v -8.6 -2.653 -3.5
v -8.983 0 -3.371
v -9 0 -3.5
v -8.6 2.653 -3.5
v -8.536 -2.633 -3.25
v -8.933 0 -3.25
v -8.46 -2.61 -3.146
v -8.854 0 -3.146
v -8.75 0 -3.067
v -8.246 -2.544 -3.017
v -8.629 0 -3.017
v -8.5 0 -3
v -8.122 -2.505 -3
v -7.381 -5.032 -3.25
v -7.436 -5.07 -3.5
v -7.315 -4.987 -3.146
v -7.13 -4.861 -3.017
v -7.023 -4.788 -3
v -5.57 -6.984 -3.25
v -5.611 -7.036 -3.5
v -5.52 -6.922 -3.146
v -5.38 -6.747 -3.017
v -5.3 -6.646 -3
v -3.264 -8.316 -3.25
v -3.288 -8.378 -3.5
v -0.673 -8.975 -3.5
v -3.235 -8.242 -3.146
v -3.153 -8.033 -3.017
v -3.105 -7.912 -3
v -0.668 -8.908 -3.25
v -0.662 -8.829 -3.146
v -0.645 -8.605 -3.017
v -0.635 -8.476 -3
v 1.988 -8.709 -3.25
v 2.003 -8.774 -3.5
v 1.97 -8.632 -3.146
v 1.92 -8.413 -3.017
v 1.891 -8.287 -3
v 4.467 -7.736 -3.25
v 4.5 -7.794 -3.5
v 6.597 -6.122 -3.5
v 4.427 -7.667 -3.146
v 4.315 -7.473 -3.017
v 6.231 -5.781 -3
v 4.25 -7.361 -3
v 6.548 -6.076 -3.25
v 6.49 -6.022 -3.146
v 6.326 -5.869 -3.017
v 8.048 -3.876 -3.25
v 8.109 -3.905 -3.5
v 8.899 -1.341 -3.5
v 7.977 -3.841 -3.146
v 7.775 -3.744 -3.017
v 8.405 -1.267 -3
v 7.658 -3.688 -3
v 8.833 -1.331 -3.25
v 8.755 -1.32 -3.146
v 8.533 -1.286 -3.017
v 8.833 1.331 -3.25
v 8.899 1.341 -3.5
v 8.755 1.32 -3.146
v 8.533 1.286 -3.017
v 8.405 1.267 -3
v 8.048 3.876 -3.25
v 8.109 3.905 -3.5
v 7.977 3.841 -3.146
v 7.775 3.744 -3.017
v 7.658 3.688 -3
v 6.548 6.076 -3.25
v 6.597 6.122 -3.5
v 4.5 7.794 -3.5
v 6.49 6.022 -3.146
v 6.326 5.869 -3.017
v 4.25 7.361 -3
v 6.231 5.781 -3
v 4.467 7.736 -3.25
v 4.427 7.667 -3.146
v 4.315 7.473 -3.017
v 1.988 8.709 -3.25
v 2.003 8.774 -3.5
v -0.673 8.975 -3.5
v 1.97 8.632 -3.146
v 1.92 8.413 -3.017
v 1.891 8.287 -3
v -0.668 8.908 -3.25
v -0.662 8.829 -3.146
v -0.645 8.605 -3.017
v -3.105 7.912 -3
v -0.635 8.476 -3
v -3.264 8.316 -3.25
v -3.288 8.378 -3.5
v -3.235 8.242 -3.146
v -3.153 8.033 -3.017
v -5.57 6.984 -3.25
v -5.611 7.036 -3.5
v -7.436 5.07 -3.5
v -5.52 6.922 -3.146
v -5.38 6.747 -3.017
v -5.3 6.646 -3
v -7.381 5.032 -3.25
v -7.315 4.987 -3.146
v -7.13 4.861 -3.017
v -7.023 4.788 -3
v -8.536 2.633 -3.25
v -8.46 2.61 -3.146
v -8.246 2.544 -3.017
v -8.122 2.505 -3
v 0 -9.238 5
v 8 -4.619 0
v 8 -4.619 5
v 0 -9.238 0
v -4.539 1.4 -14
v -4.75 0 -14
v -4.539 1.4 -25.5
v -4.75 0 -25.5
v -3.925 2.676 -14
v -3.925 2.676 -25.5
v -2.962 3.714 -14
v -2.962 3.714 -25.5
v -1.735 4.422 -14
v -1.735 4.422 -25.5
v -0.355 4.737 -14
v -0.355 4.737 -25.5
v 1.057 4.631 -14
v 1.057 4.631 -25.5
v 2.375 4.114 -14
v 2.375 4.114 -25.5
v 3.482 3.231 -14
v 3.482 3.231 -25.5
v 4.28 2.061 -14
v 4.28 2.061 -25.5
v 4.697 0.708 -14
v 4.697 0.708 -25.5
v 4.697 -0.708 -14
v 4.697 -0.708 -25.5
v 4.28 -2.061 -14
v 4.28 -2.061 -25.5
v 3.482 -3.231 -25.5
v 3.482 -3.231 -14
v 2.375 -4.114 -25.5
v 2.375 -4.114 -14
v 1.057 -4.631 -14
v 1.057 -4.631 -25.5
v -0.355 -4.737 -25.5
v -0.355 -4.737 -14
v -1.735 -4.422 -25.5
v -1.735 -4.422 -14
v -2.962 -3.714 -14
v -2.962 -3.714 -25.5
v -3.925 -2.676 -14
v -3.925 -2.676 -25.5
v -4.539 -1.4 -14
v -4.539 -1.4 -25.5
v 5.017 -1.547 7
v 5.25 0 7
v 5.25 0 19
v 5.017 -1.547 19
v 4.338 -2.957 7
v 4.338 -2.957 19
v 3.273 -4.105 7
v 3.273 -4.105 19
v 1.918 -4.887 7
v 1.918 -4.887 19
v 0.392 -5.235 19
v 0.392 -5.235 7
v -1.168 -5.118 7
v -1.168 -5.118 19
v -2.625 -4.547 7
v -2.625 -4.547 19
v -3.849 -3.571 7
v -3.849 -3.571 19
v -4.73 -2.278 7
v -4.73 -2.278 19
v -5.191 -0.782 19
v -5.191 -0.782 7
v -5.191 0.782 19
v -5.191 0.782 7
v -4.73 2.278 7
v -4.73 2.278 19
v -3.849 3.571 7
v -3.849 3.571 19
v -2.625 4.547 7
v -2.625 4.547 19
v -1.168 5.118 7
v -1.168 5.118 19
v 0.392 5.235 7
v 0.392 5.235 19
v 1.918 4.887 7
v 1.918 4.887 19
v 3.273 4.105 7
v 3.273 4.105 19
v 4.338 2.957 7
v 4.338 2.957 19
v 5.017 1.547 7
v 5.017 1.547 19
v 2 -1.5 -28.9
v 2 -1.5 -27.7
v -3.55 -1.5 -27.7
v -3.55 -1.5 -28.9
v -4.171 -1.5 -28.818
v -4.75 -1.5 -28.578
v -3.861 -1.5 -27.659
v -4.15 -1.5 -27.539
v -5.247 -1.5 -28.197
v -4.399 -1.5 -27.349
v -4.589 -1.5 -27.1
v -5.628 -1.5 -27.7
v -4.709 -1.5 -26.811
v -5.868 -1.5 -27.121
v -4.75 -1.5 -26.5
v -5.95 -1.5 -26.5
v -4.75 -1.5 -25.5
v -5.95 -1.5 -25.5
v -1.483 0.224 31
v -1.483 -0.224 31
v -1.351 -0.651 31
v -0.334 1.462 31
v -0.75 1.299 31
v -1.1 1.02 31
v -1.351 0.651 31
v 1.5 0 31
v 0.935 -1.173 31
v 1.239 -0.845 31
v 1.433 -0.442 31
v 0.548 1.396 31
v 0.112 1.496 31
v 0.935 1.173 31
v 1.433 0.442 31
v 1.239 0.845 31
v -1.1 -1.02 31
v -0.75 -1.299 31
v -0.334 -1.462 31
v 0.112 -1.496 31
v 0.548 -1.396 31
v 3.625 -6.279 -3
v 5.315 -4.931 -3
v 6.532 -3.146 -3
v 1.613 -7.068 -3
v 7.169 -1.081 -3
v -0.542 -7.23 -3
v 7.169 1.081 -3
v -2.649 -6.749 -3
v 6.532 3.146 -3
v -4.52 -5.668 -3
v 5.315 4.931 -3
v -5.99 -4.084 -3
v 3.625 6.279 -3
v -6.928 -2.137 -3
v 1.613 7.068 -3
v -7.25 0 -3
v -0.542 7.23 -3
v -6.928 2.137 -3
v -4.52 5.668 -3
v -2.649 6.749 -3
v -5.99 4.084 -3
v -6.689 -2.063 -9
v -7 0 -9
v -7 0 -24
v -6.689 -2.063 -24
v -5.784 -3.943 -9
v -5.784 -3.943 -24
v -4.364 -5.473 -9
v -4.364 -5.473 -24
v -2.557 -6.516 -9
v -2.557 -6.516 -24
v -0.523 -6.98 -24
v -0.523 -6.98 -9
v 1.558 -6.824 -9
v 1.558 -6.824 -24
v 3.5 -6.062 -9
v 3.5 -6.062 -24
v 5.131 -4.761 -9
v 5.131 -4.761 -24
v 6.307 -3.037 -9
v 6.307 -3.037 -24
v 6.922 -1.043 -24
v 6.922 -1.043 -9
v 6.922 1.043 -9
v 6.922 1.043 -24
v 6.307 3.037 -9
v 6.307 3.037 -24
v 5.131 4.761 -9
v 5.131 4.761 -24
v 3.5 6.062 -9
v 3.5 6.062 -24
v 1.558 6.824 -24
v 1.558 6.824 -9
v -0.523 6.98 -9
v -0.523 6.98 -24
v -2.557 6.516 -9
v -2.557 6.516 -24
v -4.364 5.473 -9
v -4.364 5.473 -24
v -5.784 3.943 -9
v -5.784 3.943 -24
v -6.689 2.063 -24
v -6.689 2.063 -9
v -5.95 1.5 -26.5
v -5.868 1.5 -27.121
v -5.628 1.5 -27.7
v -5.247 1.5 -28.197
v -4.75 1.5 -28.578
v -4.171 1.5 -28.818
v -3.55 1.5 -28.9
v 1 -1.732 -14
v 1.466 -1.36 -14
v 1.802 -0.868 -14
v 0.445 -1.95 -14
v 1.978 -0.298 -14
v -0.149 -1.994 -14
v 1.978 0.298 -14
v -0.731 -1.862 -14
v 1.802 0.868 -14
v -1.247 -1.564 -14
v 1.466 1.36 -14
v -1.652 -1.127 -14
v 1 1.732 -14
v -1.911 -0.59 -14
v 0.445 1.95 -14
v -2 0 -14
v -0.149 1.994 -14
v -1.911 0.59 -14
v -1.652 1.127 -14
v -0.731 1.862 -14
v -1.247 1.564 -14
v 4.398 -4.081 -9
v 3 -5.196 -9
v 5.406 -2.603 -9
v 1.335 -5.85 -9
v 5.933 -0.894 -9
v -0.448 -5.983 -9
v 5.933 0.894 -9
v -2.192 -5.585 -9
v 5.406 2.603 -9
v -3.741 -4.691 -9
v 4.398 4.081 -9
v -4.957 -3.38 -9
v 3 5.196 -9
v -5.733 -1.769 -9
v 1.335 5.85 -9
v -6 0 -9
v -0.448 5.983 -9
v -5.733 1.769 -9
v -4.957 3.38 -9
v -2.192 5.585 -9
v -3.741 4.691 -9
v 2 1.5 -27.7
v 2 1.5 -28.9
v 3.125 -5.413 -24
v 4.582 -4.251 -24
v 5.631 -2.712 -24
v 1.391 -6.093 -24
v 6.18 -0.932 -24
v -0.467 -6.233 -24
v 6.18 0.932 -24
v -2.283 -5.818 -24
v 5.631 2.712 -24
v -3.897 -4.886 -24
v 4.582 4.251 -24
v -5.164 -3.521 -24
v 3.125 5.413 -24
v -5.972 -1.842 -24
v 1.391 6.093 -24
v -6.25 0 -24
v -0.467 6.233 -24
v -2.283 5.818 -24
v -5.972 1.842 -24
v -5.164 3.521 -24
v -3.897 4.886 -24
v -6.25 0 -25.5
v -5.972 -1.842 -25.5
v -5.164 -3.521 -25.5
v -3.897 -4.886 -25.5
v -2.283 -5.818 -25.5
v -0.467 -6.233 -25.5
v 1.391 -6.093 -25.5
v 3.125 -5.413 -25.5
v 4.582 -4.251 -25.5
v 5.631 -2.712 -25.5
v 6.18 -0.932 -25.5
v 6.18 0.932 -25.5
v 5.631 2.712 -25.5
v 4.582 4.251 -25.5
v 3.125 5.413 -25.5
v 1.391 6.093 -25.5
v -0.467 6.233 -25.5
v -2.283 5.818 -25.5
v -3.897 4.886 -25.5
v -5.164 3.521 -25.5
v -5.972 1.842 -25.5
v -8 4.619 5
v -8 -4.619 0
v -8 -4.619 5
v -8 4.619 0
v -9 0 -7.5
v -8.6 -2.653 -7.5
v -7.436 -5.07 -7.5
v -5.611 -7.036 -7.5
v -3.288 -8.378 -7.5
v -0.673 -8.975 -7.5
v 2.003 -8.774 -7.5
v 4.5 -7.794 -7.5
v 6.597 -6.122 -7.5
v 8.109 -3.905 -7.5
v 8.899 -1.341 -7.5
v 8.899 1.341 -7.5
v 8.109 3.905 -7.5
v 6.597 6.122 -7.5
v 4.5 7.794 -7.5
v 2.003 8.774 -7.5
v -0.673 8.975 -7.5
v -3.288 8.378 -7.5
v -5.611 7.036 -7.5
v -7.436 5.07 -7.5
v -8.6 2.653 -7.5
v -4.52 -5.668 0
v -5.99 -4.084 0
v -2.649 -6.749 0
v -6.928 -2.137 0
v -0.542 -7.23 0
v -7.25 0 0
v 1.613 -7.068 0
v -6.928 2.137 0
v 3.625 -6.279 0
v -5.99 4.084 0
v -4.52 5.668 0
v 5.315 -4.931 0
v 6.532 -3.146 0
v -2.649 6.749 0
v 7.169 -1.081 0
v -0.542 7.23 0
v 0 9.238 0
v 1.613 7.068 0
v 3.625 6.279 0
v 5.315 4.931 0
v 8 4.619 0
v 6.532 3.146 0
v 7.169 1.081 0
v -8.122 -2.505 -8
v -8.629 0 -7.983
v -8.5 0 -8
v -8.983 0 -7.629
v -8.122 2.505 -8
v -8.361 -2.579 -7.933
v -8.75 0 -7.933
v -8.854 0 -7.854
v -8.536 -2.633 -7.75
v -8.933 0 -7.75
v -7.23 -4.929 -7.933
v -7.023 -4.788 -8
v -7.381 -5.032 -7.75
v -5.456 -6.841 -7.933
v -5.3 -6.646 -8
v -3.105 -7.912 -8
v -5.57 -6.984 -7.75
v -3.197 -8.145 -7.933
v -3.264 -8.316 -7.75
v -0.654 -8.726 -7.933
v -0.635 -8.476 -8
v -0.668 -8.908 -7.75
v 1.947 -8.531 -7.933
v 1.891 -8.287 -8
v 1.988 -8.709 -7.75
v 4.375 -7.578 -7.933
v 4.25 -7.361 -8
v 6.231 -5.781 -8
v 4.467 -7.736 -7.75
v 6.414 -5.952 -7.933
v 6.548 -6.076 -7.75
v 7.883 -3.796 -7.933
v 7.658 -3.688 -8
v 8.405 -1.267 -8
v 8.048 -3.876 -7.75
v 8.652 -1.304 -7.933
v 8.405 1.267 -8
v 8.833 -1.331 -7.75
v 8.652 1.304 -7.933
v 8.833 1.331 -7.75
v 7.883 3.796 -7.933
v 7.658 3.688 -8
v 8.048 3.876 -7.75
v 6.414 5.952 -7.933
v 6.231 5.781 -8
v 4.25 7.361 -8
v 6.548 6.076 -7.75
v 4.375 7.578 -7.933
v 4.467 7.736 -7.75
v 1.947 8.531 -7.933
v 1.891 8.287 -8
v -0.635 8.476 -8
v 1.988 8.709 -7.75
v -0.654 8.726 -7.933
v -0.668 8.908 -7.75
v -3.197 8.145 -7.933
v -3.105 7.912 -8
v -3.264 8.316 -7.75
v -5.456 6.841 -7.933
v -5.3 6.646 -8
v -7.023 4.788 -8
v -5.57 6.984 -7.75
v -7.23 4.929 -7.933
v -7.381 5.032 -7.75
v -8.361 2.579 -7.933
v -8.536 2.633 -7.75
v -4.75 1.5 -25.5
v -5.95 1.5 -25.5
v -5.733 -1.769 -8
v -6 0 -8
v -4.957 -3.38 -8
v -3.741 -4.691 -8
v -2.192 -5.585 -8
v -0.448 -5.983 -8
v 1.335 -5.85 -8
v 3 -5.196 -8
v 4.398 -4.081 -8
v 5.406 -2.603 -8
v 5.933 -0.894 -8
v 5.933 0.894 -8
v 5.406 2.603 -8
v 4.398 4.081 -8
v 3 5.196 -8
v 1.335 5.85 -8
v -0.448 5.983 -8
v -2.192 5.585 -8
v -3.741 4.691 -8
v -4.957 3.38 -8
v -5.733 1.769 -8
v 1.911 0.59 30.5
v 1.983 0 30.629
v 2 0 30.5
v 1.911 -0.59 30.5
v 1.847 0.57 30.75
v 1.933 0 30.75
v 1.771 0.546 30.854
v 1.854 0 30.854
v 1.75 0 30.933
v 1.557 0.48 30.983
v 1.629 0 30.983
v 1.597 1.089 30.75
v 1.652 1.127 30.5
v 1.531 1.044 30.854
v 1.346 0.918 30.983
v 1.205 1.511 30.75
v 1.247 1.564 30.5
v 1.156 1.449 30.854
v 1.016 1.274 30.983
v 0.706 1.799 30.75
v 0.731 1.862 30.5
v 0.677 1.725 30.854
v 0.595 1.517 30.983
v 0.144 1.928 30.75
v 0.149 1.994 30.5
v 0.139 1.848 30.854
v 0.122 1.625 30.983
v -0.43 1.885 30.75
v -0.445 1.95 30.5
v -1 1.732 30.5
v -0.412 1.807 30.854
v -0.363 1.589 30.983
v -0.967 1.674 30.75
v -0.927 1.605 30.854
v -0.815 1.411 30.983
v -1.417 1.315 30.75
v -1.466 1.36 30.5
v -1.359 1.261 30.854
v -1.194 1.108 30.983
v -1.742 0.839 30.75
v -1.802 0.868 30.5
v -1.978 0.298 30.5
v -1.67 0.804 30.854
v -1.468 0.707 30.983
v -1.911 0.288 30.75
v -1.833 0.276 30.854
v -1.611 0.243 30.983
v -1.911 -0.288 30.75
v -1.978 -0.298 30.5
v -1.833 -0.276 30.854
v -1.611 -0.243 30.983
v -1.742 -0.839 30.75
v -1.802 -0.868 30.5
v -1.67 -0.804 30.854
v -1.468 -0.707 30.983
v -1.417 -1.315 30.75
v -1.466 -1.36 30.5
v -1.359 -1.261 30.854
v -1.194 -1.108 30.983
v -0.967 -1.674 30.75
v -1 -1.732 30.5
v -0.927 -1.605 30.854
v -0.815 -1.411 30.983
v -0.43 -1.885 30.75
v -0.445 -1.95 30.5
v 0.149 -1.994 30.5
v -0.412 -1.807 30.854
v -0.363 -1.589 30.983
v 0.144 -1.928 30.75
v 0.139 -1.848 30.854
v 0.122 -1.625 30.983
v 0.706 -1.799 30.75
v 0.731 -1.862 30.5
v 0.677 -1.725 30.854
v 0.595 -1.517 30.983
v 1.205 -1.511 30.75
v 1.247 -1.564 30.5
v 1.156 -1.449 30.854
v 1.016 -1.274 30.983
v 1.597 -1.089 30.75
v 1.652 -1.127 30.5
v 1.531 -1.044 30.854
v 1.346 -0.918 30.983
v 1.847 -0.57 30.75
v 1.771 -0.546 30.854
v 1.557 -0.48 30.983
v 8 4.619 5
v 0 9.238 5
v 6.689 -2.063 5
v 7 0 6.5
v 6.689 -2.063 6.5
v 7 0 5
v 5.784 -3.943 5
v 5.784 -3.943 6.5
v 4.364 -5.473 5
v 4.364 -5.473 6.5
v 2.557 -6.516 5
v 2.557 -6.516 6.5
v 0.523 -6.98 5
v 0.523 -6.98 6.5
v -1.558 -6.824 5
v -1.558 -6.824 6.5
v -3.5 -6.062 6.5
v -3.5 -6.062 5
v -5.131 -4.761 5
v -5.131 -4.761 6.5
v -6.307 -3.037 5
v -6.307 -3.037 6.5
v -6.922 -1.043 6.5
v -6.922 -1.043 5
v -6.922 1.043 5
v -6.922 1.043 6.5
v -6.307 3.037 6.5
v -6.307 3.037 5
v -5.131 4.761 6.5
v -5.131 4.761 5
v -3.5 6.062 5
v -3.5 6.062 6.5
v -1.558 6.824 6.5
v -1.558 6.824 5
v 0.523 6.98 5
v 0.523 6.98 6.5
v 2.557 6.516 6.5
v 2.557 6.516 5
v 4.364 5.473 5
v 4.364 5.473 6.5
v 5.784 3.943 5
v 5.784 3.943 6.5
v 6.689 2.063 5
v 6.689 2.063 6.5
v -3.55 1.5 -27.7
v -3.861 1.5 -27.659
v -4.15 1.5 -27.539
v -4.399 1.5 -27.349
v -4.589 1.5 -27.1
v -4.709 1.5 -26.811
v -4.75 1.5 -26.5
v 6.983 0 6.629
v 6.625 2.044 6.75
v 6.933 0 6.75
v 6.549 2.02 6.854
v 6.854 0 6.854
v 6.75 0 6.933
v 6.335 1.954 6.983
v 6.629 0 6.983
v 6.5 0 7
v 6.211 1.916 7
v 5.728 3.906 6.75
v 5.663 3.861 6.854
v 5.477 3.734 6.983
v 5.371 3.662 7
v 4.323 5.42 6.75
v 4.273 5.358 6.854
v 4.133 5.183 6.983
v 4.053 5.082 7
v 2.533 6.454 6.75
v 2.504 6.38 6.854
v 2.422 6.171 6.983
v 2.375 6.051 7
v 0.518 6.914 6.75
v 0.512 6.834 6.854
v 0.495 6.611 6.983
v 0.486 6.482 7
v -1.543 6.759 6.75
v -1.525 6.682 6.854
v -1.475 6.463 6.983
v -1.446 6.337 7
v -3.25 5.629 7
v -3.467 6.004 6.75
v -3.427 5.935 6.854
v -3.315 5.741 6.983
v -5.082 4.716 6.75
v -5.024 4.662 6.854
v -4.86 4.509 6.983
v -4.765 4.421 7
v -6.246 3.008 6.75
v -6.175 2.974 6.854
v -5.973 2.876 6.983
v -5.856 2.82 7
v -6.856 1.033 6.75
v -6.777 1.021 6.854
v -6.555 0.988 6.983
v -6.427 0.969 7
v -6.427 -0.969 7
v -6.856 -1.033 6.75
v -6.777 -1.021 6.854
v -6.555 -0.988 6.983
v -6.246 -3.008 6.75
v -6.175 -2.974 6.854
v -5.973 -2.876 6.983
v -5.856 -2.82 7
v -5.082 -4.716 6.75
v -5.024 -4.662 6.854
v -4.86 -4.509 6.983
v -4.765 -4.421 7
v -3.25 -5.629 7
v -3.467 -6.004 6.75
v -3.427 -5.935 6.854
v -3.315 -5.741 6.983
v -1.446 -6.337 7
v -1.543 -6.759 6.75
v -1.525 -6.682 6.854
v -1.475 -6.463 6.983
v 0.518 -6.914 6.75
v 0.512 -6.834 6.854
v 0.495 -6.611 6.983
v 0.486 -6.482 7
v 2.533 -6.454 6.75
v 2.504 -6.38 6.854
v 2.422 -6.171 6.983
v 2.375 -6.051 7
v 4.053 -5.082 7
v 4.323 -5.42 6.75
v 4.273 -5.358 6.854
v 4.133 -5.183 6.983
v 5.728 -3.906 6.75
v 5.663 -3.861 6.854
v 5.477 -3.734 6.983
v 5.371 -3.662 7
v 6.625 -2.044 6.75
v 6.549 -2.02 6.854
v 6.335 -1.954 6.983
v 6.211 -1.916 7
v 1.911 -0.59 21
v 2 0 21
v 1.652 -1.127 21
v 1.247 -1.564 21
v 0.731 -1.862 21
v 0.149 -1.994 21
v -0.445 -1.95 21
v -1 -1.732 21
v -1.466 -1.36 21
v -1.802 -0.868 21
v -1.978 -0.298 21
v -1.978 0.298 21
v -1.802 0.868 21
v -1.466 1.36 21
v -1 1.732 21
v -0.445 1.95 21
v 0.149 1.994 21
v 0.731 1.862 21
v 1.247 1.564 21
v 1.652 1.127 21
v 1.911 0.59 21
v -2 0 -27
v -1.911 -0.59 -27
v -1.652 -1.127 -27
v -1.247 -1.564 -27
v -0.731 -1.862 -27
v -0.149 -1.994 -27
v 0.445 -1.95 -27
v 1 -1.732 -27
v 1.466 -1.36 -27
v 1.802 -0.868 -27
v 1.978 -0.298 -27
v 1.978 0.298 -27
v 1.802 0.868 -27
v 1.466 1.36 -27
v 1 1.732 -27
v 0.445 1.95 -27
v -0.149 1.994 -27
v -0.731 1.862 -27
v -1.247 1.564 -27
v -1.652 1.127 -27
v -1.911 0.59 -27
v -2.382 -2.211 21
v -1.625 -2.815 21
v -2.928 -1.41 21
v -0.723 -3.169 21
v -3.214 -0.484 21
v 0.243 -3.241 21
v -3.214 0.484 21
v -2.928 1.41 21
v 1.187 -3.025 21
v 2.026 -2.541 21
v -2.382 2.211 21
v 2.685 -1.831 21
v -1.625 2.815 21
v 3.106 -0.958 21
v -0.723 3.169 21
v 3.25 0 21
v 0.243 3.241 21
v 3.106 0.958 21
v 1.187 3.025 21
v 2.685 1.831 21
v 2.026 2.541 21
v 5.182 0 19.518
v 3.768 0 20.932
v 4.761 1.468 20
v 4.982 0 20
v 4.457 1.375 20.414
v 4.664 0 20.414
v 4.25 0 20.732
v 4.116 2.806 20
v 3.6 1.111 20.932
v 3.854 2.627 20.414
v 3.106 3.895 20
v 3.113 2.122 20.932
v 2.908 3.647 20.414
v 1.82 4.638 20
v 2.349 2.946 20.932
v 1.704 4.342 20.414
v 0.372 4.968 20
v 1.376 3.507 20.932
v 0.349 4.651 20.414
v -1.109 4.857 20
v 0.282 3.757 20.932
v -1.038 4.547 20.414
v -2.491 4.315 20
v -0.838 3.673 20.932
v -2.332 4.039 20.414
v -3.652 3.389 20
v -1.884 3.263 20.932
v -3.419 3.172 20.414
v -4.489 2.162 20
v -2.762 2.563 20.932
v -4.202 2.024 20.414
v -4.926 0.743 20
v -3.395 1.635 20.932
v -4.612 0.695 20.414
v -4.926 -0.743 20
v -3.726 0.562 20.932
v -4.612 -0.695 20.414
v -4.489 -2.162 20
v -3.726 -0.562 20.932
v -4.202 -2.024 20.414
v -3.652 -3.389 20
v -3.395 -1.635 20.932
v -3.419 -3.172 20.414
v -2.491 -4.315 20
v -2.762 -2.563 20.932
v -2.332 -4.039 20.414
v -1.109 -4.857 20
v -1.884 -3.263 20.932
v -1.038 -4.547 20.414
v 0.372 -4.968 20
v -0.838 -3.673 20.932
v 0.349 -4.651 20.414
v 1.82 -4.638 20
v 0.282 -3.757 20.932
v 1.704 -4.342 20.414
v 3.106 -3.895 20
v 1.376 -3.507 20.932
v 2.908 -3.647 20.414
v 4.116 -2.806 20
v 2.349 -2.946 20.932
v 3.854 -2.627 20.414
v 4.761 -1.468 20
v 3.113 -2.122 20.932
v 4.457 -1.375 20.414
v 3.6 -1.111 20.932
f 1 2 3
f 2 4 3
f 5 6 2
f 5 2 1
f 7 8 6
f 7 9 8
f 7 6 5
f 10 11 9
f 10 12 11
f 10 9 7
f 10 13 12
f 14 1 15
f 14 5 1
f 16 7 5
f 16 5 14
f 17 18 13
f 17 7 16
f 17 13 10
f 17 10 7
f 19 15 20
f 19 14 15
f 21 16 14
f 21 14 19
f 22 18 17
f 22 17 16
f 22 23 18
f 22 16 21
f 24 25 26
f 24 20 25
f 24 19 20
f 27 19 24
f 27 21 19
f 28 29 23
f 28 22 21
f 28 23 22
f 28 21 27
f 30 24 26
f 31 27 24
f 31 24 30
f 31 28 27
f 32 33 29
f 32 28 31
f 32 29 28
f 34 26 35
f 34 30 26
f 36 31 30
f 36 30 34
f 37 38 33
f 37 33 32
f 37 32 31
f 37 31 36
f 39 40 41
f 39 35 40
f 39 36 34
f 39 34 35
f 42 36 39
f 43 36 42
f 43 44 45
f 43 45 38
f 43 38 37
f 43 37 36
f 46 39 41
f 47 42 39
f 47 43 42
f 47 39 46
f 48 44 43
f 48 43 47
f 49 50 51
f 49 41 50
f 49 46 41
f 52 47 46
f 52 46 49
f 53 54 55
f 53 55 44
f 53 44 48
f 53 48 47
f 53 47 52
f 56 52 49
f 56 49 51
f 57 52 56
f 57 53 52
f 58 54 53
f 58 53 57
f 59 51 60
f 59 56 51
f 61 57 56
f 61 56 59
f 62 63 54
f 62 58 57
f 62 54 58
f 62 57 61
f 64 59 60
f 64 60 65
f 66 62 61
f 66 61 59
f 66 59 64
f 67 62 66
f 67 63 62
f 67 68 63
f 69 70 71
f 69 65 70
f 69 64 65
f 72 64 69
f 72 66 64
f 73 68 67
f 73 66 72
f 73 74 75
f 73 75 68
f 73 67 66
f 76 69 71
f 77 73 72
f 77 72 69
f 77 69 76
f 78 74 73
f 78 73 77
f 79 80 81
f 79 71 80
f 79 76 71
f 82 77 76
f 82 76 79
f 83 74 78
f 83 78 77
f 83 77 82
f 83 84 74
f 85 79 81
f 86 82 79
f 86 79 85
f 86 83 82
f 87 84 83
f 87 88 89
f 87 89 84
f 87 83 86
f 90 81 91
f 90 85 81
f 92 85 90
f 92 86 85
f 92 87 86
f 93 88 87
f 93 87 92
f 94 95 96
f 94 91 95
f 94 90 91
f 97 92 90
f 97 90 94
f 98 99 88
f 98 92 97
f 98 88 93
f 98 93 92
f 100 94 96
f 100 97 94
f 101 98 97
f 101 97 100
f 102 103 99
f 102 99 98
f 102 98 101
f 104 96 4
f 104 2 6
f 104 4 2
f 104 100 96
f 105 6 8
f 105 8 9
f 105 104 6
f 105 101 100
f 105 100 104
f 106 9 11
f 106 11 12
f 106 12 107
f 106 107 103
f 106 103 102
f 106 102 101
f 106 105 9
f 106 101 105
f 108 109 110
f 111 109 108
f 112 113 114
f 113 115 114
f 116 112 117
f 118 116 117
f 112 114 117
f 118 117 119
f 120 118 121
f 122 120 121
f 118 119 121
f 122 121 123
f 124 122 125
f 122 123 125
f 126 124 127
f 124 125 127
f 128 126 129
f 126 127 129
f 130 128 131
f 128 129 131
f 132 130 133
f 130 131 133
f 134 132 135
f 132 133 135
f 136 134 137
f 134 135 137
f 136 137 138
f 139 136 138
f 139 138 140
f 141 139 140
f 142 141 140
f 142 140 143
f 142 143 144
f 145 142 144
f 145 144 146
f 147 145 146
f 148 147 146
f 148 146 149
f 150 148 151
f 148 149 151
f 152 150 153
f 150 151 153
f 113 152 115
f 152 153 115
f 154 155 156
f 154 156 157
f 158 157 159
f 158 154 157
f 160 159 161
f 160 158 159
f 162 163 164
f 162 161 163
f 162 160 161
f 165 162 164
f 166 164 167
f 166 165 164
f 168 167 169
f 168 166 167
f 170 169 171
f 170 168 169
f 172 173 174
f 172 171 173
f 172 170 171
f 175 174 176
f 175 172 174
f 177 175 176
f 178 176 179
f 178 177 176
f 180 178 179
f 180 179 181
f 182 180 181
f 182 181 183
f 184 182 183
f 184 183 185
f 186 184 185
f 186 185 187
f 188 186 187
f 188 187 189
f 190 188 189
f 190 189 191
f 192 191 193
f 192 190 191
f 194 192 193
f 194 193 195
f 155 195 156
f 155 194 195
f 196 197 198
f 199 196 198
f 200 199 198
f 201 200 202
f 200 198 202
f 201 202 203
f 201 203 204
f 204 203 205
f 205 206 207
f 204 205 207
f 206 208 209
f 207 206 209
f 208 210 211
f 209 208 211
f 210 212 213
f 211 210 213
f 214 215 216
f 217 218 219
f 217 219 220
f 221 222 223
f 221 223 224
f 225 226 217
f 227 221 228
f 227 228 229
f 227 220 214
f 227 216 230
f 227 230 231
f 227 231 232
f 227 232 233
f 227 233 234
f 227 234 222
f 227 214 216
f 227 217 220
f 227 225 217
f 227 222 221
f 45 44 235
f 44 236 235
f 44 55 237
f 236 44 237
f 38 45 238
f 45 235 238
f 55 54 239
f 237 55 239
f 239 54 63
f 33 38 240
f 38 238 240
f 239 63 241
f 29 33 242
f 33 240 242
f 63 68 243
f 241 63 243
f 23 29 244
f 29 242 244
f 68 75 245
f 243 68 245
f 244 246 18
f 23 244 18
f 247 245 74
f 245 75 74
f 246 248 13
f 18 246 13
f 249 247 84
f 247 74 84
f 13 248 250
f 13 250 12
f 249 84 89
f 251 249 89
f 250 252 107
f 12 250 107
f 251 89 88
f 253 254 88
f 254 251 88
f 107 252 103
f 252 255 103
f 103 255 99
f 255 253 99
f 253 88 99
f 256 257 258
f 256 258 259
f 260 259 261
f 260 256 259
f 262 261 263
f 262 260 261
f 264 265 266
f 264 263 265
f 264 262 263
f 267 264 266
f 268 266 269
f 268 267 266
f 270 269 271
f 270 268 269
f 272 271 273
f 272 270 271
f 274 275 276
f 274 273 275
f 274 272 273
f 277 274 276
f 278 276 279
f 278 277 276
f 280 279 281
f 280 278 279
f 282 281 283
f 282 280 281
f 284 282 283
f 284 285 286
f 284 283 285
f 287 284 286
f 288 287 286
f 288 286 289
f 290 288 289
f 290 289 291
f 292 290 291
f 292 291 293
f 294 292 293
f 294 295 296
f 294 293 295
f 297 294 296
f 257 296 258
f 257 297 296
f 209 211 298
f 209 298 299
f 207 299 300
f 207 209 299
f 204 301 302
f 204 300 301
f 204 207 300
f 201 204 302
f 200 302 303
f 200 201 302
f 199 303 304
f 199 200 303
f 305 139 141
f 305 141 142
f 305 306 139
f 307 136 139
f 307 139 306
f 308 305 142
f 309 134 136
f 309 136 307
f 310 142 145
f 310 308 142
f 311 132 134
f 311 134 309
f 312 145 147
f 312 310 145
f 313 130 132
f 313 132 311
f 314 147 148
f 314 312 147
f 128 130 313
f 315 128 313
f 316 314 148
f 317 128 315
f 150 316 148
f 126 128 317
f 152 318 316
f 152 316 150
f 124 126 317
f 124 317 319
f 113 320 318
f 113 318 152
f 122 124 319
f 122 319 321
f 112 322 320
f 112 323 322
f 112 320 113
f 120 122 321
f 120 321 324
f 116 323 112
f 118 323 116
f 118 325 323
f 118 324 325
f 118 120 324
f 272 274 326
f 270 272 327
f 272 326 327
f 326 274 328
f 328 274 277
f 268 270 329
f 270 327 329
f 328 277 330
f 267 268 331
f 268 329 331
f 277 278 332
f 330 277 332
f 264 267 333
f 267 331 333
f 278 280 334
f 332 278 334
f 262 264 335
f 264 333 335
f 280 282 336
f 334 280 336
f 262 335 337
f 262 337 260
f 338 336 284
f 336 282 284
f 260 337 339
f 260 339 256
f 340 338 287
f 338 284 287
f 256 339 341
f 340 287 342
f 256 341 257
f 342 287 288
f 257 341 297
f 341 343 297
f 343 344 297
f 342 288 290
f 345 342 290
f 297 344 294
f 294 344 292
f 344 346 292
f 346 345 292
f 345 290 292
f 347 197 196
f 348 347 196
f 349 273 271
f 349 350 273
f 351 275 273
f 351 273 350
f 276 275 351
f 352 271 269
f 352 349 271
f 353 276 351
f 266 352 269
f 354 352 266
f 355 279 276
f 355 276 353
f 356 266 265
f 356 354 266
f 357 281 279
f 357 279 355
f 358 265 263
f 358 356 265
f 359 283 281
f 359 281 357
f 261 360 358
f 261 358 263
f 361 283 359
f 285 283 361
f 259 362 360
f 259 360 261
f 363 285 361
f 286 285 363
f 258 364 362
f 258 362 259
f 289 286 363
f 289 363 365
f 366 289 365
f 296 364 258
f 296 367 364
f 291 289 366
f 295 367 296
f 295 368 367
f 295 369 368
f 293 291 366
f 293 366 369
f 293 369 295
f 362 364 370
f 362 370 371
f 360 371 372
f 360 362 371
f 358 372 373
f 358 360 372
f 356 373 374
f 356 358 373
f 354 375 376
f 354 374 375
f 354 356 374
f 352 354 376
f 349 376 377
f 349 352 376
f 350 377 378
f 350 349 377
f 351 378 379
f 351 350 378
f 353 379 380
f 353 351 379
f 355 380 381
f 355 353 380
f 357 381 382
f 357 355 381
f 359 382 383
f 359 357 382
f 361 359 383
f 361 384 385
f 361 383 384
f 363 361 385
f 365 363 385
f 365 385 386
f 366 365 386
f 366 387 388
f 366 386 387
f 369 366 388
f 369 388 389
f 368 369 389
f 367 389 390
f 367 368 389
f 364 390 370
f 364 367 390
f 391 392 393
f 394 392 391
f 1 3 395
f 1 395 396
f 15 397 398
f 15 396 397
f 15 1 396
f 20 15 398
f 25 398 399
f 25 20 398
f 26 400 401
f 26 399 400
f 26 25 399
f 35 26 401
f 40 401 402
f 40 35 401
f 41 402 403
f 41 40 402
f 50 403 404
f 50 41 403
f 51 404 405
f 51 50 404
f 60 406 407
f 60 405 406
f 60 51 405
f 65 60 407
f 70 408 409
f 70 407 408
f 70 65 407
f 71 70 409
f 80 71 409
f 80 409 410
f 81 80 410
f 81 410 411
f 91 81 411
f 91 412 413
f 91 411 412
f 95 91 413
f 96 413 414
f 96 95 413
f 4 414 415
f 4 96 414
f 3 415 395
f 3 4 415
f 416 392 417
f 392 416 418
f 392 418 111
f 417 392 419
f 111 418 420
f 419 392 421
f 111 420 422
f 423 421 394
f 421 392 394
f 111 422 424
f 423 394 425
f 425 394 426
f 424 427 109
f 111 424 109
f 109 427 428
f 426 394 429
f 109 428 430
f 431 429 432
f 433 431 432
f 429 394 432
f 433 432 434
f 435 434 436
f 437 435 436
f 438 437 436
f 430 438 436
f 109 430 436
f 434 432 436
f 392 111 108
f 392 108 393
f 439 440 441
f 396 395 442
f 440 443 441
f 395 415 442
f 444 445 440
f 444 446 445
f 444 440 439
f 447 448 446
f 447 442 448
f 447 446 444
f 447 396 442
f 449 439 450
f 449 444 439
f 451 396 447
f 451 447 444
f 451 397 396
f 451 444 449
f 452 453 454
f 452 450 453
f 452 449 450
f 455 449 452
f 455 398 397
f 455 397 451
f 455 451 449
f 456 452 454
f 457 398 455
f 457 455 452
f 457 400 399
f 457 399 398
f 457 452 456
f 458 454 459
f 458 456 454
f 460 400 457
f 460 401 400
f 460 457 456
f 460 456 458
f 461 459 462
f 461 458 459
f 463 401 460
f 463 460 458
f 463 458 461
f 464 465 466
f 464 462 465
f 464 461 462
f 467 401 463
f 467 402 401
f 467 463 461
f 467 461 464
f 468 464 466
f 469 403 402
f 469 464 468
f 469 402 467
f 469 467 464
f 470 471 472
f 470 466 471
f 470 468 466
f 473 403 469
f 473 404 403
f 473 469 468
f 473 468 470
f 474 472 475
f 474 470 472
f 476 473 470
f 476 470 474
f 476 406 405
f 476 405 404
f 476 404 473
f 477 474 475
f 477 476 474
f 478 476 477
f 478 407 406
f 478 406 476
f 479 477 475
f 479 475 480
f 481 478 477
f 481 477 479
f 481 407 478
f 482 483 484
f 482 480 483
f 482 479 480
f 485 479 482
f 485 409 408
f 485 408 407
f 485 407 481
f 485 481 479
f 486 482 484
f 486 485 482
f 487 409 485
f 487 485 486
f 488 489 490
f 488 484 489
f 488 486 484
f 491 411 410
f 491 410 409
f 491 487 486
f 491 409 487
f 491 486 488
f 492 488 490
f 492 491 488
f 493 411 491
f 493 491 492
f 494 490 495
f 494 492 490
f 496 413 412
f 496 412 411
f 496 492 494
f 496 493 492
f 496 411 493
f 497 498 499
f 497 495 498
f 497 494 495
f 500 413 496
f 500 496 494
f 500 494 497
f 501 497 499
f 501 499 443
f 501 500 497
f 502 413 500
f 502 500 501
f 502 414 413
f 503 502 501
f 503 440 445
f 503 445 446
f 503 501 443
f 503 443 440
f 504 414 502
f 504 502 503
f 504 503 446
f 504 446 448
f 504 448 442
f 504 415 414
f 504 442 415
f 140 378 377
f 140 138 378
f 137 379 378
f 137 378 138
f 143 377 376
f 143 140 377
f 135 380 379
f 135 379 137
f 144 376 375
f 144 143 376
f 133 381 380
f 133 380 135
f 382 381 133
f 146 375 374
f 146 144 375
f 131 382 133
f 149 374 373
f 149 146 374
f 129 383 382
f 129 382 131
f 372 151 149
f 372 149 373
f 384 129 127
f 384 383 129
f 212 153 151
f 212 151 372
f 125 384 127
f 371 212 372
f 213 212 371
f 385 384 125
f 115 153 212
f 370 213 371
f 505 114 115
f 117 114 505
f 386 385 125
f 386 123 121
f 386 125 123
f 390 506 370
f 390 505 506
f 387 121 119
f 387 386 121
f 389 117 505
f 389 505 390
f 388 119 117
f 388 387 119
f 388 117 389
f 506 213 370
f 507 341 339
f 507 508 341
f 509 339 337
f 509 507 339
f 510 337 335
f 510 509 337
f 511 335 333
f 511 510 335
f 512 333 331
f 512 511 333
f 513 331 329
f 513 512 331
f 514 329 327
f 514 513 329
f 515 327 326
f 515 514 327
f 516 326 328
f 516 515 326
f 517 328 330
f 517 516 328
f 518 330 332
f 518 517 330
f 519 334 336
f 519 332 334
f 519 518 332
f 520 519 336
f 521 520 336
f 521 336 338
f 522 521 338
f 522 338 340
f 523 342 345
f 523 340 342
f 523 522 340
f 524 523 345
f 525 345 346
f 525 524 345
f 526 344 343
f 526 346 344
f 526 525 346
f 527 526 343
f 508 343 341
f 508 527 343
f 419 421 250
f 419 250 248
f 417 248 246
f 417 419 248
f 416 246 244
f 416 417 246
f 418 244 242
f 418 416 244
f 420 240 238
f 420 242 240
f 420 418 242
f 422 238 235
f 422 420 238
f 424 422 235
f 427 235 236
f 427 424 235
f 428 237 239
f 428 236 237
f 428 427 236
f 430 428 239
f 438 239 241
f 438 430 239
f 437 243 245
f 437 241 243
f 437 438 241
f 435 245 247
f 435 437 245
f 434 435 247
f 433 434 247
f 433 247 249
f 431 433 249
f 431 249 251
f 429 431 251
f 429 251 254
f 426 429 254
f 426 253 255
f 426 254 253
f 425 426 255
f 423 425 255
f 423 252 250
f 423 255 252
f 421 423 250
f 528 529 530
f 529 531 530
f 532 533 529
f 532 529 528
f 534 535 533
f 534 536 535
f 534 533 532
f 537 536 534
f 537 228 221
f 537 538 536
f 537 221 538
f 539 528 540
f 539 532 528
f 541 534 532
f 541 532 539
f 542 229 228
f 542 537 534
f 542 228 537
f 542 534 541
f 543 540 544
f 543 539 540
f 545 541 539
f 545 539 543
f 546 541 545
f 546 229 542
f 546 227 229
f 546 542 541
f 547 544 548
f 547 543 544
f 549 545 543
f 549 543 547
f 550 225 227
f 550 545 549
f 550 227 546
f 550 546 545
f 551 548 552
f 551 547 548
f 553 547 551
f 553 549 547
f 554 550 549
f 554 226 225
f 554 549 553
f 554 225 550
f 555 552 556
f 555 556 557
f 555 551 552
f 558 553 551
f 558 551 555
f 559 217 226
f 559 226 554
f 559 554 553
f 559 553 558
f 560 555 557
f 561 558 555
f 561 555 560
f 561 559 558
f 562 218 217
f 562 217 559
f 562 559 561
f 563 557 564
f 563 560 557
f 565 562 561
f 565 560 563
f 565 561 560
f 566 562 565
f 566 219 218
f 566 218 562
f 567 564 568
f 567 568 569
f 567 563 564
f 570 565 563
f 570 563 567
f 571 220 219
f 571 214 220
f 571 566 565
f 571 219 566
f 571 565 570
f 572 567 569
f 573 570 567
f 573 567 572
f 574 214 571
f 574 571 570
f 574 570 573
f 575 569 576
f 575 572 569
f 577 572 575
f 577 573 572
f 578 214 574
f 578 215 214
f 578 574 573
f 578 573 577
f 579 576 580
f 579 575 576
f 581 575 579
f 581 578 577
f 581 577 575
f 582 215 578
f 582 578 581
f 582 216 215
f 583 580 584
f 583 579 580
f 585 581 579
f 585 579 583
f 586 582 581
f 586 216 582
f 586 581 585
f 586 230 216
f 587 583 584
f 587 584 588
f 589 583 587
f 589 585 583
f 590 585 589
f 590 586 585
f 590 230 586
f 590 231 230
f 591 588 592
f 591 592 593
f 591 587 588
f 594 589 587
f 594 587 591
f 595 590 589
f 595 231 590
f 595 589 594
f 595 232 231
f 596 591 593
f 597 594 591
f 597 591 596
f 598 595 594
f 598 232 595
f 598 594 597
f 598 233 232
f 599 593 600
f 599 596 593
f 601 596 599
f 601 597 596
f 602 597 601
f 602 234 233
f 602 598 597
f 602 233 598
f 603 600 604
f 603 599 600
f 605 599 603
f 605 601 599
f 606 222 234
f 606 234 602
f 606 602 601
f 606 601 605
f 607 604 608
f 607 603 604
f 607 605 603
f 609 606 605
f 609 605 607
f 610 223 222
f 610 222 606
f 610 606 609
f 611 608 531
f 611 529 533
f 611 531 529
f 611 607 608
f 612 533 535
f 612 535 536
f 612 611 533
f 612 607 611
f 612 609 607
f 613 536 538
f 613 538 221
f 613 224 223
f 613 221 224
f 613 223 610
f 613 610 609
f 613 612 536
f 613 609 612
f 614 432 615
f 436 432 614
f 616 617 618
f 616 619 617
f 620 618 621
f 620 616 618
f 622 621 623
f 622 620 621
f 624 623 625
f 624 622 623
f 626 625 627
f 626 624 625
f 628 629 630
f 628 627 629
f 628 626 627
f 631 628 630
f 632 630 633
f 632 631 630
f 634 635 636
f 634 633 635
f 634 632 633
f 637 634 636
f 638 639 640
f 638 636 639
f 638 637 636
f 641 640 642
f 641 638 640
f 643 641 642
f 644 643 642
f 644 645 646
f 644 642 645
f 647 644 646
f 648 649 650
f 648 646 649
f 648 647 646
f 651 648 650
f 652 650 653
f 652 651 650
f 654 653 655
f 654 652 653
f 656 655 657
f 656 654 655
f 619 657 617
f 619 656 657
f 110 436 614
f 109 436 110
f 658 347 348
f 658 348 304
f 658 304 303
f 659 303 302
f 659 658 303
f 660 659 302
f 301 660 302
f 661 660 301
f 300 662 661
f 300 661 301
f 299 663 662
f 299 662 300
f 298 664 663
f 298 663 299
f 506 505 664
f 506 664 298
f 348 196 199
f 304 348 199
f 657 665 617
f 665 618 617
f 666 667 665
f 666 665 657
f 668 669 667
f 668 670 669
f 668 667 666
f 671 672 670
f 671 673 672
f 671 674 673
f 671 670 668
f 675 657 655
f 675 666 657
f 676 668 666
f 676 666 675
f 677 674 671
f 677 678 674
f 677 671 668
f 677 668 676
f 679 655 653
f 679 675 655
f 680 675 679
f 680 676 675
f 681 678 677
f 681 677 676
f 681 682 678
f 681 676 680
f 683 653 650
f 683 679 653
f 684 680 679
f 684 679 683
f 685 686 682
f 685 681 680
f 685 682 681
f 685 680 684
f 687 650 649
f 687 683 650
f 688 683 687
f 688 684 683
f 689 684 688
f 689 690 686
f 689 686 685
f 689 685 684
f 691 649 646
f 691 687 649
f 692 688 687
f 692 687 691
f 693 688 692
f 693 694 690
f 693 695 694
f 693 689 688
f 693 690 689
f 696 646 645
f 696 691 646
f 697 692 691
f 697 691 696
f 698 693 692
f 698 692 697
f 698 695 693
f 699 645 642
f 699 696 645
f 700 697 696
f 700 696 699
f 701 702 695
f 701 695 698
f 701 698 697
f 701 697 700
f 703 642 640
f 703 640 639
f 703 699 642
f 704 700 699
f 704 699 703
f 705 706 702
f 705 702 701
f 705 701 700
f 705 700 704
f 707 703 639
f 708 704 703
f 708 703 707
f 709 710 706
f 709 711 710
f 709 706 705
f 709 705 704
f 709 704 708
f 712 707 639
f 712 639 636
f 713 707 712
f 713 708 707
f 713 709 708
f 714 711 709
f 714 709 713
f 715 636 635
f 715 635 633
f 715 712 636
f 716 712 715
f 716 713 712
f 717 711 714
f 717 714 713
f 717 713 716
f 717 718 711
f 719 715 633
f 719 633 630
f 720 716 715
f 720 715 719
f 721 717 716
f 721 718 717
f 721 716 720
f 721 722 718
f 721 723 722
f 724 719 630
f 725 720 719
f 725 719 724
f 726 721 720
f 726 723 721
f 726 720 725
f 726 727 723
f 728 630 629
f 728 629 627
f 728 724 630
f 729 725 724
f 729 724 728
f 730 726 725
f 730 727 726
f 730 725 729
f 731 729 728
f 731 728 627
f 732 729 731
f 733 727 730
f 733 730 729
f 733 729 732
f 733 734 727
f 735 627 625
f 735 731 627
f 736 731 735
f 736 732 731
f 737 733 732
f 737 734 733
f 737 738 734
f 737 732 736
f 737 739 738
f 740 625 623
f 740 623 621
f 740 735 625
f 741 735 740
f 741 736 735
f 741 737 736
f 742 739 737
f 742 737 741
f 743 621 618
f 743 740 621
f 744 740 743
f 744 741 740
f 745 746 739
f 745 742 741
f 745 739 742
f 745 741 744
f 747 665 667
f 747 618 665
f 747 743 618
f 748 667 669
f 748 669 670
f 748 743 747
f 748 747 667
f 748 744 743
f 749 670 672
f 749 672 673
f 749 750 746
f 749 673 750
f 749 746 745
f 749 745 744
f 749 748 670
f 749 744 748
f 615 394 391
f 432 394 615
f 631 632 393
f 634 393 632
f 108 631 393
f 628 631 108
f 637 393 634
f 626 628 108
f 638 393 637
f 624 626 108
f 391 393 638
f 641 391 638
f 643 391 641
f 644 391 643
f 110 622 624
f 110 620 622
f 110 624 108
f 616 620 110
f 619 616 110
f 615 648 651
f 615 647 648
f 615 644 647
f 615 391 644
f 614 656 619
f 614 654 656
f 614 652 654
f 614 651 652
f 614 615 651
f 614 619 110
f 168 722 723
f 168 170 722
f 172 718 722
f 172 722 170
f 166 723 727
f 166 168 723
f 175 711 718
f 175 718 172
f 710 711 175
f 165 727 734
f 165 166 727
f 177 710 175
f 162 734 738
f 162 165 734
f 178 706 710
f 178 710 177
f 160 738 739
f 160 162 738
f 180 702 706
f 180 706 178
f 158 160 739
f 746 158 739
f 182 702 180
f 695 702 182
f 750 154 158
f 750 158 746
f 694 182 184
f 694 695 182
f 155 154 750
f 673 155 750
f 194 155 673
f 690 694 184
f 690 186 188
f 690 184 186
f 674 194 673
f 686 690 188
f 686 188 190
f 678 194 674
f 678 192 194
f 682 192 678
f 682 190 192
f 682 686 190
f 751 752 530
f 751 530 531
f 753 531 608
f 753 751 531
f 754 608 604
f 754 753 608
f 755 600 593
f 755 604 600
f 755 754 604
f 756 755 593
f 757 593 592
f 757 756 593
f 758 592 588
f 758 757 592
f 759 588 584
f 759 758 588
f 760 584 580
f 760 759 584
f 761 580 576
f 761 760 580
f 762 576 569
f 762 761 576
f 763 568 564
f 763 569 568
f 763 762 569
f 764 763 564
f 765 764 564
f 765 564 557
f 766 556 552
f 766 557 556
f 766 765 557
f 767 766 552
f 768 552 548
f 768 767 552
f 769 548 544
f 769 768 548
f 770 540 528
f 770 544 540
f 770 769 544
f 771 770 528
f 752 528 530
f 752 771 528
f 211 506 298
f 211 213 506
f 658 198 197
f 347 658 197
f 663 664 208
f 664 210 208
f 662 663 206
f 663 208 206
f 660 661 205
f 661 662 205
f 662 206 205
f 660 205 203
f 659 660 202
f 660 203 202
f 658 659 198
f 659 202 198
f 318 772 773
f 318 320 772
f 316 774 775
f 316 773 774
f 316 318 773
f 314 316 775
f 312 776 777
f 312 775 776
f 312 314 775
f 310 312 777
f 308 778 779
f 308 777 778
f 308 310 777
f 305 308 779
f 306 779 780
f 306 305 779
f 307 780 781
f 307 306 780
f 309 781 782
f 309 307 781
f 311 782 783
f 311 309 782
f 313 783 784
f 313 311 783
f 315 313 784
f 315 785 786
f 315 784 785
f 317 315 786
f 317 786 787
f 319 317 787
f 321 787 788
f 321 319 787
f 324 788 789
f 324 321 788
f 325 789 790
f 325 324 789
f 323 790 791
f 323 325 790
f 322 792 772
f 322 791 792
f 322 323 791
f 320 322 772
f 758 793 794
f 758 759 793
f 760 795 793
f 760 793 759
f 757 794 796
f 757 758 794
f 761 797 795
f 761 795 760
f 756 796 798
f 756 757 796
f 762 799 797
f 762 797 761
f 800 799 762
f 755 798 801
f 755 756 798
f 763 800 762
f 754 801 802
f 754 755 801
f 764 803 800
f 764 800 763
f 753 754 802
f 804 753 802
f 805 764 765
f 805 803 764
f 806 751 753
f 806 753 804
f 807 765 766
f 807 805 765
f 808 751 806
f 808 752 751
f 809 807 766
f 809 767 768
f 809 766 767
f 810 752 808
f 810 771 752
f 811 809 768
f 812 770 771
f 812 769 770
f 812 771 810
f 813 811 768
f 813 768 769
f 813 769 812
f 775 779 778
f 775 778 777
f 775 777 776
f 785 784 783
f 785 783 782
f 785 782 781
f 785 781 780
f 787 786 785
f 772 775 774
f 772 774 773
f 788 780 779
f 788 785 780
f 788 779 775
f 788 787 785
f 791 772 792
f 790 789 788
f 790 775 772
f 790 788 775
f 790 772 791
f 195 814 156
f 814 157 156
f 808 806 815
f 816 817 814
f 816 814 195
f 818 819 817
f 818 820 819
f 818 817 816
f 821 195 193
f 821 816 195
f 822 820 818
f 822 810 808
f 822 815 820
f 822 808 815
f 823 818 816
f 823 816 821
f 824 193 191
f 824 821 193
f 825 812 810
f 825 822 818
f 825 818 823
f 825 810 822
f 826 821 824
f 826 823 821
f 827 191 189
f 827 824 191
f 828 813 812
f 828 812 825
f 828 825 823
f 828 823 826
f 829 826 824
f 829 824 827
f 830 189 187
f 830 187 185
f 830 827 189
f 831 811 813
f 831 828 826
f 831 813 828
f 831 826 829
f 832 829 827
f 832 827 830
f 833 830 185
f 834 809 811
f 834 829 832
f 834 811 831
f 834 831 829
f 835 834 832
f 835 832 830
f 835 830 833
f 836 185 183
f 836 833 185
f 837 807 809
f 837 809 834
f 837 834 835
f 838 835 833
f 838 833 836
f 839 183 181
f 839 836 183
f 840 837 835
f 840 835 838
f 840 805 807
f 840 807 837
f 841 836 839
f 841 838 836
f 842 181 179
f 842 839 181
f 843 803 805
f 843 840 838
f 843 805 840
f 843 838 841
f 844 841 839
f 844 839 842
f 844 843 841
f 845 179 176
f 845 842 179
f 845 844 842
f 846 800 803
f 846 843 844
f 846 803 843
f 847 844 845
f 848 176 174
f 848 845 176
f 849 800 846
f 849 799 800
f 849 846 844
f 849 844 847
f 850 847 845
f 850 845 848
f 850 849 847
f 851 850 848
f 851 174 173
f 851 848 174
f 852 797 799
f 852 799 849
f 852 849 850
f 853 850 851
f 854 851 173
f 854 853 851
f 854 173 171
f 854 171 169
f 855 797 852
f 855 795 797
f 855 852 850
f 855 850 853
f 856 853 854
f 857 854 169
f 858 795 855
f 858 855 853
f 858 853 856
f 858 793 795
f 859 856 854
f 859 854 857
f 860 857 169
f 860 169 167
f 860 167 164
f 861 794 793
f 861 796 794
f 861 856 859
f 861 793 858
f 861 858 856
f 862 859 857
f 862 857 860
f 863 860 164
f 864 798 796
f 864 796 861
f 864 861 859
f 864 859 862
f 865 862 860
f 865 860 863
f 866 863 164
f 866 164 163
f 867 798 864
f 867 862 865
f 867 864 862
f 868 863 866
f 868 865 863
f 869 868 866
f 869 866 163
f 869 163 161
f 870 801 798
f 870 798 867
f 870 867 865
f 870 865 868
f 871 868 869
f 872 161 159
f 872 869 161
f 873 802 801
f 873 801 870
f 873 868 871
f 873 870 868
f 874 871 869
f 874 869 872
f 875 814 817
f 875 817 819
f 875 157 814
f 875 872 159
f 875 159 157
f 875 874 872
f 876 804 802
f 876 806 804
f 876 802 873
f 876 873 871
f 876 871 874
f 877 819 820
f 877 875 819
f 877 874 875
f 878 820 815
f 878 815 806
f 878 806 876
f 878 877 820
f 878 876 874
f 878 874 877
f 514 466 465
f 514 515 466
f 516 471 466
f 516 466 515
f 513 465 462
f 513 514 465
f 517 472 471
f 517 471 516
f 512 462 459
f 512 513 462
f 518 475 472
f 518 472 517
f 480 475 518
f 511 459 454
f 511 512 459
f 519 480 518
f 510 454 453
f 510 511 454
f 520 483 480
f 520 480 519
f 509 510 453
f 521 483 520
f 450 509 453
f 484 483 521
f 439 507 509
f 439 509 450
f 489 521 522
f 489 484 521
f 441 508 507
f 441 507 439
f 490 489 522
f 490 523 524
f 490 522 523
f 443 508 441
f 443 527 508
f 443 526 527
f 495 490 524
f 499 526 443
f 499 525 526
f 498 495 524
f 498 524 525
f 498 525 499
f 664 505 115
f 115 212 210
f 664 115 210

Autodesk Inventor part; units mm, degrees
ref_plane "YZ Plane" through (0, 0, 0) normal (1, 0, 0) x (0, 1, 0)
ref_plane "XZ Plane" through (0, 0, 0) normal (0, 1, 0) x (-1, 0, 0)
ref_plane "XY Plane" through (0, 0, 0) normal (0, 0, 1) x (1, 0, 0)
sketch "Esboço1" plane through (0, 0, 0) normal (0, 0, 1) x (1, 0, 0)
  line L0 (0, 9.2376) -> (8, 4.6188)
  line L1 (8, 4.6188) -> (8, -4.6188)
  line L2 (8, -4.6188) -> (0, -9.2376)
  line L3 (0, -9.2376) -> (-8, -4.6188)
  line L4 (-8, -4.6188) -> (-8, 4.6188)
  line L5 (-8, 4.6188) -> (0, 9.2376)
  point P0 (0, 0)
  point P1 (0, 0)
  dimension "d0" = 16
extrude "Extrusão1" add sketch "Esboço1" along normal blind 5
sketch "Esboço2" plane through (0, 0, 0) normal (0, 0, -1) x (-1, 0, 0)
  circle A0 centre (0, 0) radius 7.25
  dimension "d3" = 14.5
extrude "Extrusão2" add sketch "Esboço2" along normal blind 3
sketch "Esboço3" plane through (0, 0, -3) normal (0, 0, -1) x (-1, 0, 0)
  circle A0 centre (0, 0) radius 9
  dimension "d6" = 18
extrude "Extrusão3" add sketch "Esboço3" along normal blind 5
sketch "Esboço4" plane through (0, 0, -8) normal (0, 0, -1) x (-1, 0, 0)
  circle A0 centre (0, 0) radius 6
  dimension "d9" = 12
extrude "Extrusão4" add sketch "Esboço4" along normal blind 1
sketch "Esboço5" plane through (0, 0, -9) normal (0, 0, -1) x (-1, 0, 0)
  circle A0 centre (0, 0) radius 7
  dimension "d12" = 14
extrude "Extrusão5" add sketch "Esboço5" along normal blind 15
sketch "Esboço6" plane through (0, 0, -24) normal (0, 0, -1) x (-1, 0, 0)
  circle A0 centre (0, 0) radius 6.25
  dimension "d15" = 12.5
extrude "Extrusão6" add sketch "Esboço6" along normal blind 1.5
sketch "Esboço7" plane through (0, 0, -25.5) normal (0, 0, -1) x (-1, 0, 0)
  circle A0 centre (0, 0) radius 4.75
  dimension "d18" = 9.5
extrude "Extrusão7" cut sketch "Esboço7" against normal blind 11.5
sketch "Esboço8" plane through (0, 0, -14) normal (0, 0, -1) x (-1, 0, 0)
  circle A0 centre (0, 0) radius 2
  dimension "d21" = 4
extrude "Extrusão8" add sketch "Esboço8" along normal blind 13
sketch "Esboço9" plane through (0, 0, 0) normal (0, 1, 0) x (-1, 0, 0)
  line L0 (4.75, -25.5) -> (4.75, -14) projected
  line L1 (4.75, -25.5) -> (4.75, -26.5)
  line L2 (-6.25, -25.5) -> (6.25, -25.5) projected
  line L3 (5.95, -25.5) -> (5.95, -26.5)
  line L4 (3.55, -27.7) -> (-2, -27.7)
  line L5 (-2, -27.7) -> (-2, -28.9)
  line L6 (-2, -28.9) -> (3.55, -28.9)
  arc A0 (3.55, -27.7) -> (4.75, -26.5) centre (3.55, -26.5) ccw
  arc A1 (3.55, -28.9) -> (5.95, -26.5) centre (3.55, -26.5) ccw
  line L7 (-2, -27) -> (2, -27) projected
  line L8 (5.95, -25.5) -> (4.75, -25.5)
  point P0 (0, 0)
  dimension "d24" = 1.2
  dimension "d25" = 2.4
  dimension "d26" = 0.7
  dimension "d27" = 1.2
  dimension "d28" = 1.2
  dimension "d29" = 2
extrude "Extrusão9" add sketch "Esboço9" along normal mid plane 3
sketch "Esboço10" plane through (0, 0, 5) normal (0, 0, 1) x (1, 0, 0)
  circle A0 centre (0, 0) radius 7
  dimension "d32" = 14
extrude "Extrusão10" add sketch "Esboço10" along normal blind 2
sketch "Esboço11" plane through (0, 0, 7) normal (0, 0, 1) x (1, 0, 0)
  circle A0 centre (0, 0) radius 5.25
  dimension "d35" = 10.5
extrude "Extrusão11" add sketch "Esboço11" along normal blind 14
sketch "Esboço12" plane through (0, 0, 21) normal (0, 0, 1) x (1, 0, 0)
  circle A0 centre (0, 0) radius 2
  dimension "d38" = 4
extrude "Extrusão12" add sketch "Esboço12" along normal blind 10
fillet "Arredondamento1" radius 0.5 4 edges at (-2, 0, 31) (-7, 0, 7) (9, 0, -3) (9, 0, -8)
fillet "Arredondamento2" radius 2 1 edges at (-5.25, 0, 21)
thread "Rosca1" size "M14x1.5" class "6g" standard "ANSI Metric M Profile" full length
